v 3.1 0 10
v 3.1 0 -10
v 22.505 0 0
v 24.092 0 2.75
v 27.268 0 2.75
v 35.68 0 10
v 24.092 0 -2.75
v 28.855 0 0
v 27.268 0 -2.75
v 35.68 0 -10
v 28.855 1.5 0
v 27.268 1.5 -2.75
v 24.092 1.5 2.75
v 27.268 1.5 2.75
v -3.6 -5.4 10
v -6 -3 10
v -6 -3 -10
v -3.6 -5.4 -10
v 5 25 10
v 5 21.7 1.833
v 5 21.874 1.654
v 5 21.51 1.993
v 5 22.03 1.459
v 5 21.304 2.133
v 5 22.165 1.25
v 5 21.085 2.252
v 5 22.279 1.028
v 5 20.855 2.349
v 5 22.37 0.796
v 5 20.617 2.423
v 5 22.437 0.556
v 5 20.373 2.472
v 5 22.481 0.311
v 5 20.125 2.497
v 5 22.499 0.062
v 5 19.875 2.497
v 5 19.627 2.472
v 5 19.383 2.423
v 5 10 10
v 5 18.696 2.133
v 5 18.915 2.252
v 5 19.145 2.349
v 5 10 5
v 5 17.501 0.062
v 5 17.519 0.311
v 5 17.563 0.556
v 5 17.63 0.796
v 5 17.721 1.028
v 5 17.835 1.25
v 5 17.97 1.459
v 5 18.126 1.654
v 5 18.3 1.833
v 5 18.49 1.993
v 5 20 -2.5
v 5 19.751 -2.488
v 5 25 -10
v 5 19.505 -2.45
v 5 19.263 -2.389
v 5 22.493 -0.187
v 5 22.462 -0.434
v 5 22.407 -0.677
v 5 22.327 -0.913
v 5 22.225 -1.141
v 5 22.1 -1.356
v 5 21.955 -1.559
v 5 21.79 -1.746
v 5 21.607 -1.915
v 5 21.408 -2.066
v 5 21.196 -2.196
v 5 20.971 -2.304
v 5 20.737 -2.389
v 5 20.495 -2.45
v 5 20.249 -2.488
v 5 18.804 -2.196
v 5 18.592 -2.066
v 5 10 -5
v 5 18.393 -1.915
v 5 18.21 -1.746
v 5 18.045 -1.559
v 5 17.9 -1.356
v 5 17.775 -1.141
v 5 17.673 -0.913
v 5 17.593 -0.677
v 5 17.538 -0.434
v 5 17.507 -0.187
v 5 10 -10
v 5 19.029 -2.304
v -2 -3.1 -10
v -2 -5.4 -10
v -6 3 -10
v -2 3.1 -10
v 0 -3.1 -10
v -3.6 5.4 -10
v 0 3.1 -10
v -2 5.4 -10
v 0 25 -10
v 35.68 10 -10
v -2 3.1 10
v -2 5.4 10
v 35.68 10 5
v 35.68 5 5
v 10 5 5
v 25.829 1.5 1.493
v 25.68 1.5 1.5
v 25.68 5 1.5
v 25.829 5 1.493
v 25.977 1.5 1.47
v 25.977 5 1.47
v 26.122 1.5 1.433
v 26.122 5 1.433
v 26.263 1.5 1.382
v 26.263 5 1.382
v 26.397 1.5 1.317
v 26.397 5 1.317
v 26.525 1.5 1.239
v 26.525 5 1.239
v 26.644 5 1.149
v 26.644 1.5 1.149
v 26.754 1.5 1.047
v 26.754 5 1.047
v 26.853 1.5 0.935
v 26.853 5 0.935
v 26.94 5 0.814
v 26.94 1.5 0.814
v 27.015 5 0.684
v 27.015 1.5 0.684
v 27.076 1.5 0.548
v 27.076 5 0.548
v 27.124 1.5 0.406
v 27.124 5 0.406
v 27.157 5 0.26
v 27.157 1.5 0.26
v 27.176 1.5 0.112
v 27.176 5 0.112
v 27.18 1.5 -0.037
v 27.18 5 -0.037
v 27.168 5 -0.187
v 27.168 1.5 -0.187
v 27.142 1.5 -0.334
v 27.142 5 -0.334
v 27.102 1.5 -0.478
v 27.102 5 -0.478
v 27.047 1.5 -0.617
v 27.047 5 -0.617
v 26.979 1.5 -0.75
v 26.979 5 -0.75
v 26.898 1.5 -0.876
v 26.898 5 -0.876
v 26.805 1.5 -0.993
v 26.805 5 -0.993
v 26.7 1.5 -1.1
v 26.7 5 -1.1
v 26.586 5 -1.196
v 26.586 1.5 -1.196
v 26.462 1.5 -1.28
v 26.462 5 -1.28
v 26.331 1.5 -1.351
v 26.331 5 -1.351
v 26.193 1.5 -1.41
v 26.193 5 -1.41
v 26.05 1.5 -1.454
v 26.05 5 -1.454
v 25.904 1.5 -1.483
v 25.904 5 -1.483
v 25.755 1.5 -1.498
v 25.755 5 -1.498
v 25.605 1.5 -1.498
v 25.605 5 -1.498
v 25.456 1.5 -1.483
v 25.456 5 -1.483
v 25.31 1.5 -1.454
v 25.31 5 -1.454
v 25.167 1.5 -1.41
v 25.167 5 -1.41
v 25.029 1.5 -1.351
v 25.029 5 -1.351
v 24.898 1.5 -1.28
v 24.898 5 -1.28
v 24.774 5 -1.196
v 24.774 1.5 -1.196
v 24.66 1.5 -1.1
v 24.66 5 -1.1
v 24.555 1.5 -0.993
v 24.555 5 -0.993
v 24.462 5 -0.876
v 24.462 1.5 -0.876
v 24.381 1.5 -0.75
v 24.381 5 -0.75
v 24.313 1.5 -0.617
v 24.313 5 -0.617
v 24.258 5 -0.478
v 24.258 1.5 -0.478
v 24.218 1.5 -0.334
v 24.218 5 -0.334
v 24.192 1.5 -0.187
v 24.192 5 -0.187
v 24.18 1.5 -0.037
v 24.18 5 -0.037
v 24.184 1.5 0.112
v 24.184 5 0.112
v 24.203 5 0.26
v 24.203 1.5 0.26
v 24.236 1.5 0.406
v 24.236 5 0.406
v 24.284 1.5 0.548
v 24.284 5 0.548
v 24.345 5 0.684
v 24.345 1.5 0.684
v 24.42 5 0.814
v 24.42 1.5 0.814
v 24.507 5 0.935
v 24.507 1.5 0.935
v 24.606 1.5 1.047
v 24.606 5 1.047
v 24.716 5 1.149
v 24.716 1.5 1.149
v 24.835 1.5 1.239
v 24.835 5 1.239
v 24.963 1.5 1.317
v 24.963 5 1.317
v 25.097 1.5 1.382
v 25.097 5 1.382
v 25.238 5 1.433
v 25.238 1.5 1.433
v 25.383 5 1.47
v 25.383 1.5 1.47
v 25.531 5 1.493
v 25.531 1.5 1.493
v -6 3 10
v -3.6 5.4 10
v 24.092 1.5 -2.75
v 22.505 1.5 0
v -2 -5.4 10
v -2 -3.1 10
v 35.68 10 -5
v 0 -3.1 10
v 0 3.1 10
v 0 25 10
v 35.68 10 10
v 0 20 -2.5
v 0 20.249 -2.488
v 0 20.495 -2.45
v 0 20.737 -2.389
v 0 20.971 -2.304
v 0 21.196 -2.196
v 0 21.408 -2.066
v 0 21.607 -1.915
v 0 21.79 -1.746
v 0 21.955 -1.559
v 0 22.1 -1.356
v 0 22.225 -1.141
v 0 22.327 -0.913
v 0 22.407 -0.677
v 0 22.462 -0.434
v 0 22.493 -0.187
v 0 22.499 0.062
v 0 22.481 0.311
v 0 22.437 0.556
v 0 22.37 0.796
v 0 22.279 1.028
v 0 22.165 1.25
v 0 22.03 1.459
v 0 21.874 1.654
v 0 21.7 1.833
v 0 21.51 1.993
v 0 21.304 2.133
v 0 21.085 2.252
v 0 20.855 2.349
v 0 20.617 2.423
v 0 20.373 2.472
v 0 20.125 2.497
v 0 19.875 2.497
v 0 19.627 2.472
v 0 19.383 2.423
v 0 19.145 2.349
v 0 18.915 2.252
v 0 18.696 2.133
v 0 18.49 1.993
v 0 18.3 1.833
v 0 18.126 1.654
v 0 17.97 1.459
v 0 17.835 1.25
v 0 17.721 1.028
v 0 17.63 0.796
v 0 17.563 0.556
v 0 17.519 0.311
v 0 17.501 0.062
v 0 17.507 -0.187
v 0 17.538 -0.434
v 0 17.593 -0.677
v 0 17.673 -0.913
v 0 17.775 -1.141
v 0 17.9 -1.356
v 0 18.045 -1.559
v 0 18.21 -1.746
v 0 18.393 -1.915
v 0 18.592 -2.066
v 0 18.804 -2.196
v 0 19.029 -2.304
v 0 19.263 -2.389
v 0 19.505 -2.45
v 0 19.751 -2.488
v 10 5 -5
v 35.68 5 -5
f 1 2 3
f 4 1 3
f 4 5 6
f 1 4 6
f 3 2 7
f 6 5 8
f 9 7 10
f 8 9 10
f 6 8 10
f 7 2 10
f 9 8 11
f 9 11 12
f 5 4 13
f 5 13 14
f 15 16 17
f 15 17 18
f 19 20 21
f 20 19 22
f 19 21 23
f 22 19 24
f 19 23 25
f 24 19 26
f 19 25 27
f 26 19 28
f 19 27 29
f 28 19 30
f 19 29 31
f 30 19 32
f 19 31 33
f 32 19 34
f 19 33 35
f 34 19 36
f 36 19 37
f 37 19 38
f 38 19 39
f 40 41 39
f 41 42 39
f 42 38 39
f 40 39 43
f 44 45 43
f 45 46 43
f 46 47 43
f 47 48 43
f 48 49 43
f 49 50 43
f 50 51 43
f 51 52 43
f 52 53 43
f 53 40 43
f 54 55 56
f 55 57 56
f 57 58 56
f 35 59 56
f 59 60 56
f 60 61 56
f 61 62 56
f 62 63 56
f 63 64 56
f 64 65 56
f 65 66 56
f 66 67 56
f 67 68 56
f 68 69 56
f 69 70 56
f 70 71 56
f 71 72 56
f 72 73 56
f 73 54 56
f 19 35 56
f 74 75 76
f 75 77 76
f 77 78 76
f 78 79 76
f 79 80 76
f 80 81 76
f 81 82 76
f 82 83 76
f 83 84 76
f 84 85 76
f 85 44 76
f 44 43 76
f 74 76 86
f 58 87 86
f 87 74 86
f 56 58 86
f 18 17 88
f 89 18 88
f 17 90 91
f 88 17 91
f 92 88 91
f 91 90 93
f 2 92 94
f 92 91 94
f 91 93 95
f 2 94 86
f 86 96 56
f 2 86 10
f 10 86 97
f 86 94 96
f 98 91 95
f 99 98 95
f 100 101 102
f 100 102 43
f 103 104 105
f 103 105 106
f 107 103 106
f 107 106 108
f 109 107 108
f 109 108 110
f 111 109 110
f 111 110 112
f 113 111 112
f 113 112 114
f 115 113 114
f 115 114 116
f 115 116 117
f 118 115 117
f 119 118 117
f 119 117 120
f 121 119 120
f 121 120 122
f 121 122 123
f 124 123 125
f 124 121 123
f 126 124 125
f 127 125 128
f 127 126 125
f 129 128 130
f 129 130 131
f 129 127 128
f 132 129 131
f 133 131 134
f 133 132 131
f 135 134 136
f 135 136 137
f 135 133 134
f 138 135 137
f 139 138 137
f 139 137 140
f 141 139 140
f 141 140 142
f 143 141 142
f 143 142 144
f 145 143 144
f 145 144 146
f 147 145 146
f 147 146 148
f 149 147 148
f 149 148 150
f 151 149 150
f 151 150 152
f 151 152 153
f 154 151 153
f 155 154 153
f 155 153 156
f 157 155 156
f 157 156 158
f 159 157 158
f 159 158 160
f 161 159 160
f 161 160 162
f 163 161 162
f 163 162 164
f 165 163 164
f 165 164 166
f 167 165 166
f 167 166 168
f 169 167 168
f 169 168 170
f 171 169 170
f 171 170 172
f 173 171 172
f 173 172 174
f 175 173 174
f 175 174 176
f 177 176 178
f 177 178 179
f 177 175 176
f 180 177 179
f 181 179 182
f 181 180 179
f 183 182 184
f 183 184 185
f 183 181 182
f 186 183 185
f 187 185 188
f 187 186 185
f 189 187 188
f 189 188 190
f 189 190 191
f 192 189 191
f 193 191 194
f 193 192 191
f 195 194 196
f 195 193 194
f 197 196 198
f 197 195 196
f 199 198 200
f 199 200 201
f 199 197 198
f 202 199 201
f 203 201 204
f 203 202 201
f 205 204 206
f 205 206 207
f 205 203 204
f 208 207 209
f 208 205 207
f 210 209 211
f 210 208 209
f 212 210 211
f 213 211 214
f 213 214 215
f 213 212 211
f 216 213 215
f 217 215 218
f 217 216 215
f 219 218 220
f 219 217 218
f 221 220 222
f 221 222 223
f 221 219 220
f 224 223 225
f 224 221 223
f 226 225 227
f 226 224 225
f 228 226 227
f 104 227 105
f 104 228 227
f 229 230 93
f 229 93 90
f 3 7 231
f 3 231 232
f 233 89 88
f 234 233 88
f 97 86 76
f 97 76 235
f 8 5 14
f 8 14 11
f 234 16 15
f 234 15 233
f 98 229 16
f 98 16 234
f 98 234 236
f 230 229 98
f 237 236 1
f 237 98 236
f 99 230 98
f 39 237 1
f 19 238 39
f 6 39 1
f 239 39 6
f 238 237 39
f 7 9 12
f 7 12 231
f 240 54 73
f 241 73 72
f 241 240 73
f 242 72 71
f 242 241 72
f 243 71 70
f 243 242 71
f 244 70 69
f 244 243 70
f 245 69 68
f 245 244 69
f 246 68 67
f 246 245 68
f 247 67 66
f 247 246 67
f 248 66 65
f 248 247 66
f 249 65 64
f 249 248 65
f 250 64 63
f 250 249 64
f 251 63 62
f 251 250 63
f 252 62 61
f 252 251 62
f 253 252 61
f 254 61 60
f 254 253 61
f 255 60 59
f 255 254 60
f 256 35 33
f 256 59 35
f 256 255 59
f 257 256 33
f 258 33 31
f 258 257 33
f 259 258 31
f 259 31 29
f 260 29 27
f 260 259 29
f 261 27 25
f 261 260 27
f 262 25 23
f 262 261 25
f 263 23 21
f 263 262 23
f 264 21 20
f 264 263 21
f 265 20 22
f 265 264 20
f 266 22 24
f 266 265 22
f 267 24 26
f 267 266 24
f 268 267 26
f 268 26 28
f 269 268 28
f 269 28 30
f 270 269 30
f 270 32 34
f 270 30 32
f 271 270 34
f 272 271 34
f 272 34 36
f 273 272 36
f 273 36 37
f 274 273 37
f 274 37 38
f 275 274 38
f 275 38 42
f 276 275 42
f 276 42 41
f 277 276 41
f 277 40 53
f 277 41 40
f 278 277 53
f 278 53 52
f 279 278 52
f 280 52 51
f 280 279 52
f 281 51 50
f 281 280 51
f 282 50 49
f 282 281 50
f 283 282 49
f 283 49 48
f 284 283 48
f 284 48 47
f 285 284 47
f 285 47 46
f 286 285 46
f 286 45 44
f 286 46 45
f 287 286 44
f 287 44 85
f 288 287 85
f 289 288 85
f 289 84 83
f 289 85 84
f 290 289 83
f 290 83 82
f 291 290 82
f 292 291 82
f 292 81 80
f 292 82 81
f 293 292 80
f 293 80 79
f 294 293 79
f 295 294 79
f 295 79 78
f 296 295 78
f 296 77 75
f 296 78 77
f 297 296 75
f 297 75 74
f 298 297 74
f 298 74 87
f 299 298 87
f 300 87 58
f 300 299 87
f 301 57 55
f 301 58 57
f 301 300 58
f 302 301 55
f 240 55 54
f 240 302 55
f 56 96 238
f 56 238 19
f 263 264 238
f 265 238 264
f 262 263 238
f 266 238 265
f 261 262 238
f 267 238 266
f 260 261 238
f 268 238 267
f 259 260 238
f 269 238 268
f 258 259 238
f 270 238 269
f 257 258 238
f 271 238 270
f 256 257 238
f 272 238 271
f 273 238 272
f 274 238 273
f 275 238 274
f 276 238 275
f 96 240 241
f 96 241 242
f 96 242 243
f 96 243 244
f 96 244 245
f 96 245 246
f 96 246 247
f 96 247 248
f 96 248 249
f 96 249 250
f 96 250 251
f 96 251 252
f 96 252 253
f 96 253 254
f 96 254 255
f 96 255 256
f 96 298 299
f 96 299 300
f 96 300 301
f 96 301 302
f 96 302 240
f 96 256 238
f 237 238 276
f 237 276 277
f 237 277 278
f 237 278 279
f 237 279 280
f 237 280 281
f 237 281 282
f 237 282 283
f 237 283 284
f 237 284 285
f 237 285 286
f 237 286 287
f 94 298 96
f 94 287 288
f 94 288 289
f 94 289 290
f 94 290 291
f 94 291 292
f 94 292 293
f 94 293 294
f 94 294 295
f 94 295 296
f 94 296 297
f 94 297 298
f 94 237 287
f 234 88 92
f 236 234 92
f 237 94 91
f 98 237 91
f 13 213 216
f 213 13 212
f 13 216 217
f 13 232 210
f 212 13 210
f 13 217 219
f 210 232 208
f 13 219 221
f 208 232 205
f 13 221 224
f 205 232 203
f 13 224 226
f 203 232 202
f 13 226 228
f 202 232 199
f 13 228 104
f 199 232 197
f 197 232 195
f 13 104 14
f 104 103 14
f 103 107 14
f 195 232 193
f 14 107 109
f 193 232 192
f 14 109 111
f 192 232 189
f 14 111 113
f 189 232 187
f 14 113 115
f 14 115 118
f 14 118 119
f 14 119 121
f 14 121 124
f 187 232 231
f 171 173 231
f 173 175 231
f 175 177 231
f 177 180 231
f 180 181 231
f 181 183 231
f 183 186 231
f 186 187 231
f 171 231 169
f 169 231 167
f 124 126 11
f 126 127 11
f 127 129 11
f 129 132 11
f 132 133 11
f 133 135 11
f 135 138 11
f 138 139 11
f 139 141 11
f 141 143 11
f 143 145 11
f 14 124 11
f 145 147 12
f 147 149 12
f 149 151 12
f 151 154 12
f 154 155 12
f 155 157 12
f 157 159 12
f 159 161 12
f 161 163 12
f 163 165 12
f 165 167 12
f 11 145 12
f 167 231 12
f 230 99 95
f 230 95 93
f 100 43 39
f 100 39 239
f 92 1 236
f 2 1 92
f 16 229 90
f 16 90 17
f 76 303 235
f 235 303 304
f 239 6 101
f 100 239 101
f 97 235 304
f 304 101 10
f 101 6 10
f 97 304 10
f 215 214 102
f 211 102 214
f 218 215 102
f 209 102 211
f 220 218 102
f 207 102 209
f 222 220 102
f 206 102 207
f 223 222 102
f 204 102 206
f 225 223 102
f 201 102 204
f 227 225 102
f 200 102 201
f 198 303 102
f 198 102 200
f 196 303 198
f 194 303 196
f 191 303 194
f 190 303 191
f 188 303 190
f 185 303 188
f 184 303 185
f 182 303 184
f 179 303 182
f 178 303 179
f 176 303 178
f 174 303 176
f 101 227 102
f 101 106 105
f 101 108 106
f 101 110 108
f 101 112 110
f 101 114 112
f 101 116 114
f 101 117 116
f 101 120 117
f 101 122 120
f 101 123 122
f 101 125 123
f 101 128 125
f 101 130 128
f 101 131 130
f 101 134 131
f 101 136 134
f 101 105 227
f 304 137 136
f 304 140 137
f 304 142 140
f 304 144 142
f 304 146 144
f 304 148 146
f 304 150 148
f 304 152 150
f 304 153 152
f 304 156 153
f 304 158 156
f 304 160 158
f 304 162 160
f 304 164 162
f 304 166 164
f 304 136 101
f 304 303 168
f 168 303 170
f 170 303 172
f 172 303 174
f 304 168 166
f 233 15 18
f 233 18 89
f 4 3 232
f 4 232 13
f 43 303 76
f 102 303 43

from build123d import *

# Parameters (mm, degrees)
SKETCH_1_W          = 35.68
SKETCH_1_H          = 20
SKETCH_1_R          = 1.5
EXTRUDE_1_DEPTH     = 5
EXTRUDE_2_DEPTH     = 10
SKETCH_1_5_R        = 1.5
CUT_EXTRUDE_1_DEPTH = 1.5
EXTRUDE_4_DEPTH     = 25
CUT_EXTRUDE_3_REACH = 46.7
SKETCH_3_R          = 2.5
EXTRUDE_START       = -10
EXTRUDE_3_DEPTH     = 20
CHAMFER_1_SIZE      = 3.1
CHAMFER_2_SIZE      = 5


with BuildPart() as part:
    # 草图1 → 凸台-拉伸1 (new body)
    with BuildSketch(Plane(origin=(0, 0, 0), x_dir=(1, 0, 0), z_dir=(0, 1, 0))):
        with Locations((17.84, 0)):
            Rectangle(SKETCH_1_W, SKETCH_1_H)
        with Locations(Location((25.68, 0, 0), (0, 0, 270))):
            Circle(SKETCH_1_R, mode=Mode.SUBTRACT)
    extrude(amount=EXTRUDE_1_DEPTH)

    # 草图1<4> → 凸台-拉伸2 (add)
    with BuildSketch(Plane(origin=(0, 0, 0), x_dir=(1, 0, 0), z_dir=(0, 1, 0))):
        Polygon((25.68, 5), (35.68, 5), (35.68, 10), (5, 10), (5, 5), align=None)
        Polygon((35.68, -10), (35.68, -5), (25.68, -5), (5, -5), (5, -10), align=None)
    extrude(amount=EXTRUDE_2_DEPTH)

    # 草图1<5> → 切除-拉伸1 (cut)
    with BuildSketch(Plane(origin=(0, 0, 0), x_dir=(1, 0, 0), z_dir=(0, 1, 0))):
        Polygon((24.09228676, -2.75), (27.26771324, -2.75), (28.855426481, 0), (27.26771324, 2.75), (24.09228676, 2.75), (22.504573519, 0), align=None)
        with Locations(Location((25.68, 0, 0), (0, 0, 270))):
            Circle(SKETCH_1_5_R, mode=Mode.SUBTRACT)
    extrude(amount=CUT_EXTRUDE_1_DEPTH, mode=Mode.SUBTRACT)

    # 草图1<6> → 凸台-拉伸4 (add)
    with BuildSketch(Plane(origin=(0, 0, 0), x_dir=(1, 0, 0), z_dir=(0, 1, 0))):
        Polygon((5, -5), (5, 5), (5, 10), (0, 10), (0, -10), (5, -10), align=None)
    extrude(amount=EXTRUDE_4_DEPTH)

    # 草图3 → 切除-拉伸3 (cut, up to next)
    with BuildSketch(Plane(origin=(0, 0, 0), x_dir=(0, 0, -1), z_dir=(1, 0, 0)), mode=Mode.PRIVATE) as cut_extrude_3_sk1:
        with Locations((0, 20)):
            Circle(SKETCH_3_R)
    cut_extrude_3_tool1 = extrude(cut_extrude_3_sk1.sketch, amount=CUT_EXTRUDE_3_REACH, mode=Mode.PRIVATE) & part.part
    add(cut_extrude_3_tool1.solids().sort_by_distance((0, 20, 0))[0], mode=Mode.SUBTRACT)

    # 草图2 → 凸台-拉伸3 (add)
    with BuildSketch(Plane.XY.offset(EXTRUDE_START)):
        Polygon((0, 3.1), (-2, 3.1), (-2, 5.4), (-3.6, 5.4), (-6, 3), (-6, -3), (-3.6, -5.4), (-2, -5.4), (-2, -3.1), (0, -3.1), align=None)
    extrude(amount=EXTRUDE_3_DEPTH)

    # 倒角1
    chamfer_1_edges = [part.edges().sort_by_distance(p)[0] for p in [
        (0, 0, 0),
    ]]
    chamfer(chamfer_1_edges, length=CHAMFER_1_SIZE - 0.0001)  # a hair under: the kernel refuses the full size

    # 倒角2
    chamfer_2_edges = [part.edges().sort_by_distance(p)[0] for p in [
        (5, 5, 0),
    ]]
    chamfer(chamfer_2_edges, length=CHAMFER_2_SIZE)


solid = part.part
